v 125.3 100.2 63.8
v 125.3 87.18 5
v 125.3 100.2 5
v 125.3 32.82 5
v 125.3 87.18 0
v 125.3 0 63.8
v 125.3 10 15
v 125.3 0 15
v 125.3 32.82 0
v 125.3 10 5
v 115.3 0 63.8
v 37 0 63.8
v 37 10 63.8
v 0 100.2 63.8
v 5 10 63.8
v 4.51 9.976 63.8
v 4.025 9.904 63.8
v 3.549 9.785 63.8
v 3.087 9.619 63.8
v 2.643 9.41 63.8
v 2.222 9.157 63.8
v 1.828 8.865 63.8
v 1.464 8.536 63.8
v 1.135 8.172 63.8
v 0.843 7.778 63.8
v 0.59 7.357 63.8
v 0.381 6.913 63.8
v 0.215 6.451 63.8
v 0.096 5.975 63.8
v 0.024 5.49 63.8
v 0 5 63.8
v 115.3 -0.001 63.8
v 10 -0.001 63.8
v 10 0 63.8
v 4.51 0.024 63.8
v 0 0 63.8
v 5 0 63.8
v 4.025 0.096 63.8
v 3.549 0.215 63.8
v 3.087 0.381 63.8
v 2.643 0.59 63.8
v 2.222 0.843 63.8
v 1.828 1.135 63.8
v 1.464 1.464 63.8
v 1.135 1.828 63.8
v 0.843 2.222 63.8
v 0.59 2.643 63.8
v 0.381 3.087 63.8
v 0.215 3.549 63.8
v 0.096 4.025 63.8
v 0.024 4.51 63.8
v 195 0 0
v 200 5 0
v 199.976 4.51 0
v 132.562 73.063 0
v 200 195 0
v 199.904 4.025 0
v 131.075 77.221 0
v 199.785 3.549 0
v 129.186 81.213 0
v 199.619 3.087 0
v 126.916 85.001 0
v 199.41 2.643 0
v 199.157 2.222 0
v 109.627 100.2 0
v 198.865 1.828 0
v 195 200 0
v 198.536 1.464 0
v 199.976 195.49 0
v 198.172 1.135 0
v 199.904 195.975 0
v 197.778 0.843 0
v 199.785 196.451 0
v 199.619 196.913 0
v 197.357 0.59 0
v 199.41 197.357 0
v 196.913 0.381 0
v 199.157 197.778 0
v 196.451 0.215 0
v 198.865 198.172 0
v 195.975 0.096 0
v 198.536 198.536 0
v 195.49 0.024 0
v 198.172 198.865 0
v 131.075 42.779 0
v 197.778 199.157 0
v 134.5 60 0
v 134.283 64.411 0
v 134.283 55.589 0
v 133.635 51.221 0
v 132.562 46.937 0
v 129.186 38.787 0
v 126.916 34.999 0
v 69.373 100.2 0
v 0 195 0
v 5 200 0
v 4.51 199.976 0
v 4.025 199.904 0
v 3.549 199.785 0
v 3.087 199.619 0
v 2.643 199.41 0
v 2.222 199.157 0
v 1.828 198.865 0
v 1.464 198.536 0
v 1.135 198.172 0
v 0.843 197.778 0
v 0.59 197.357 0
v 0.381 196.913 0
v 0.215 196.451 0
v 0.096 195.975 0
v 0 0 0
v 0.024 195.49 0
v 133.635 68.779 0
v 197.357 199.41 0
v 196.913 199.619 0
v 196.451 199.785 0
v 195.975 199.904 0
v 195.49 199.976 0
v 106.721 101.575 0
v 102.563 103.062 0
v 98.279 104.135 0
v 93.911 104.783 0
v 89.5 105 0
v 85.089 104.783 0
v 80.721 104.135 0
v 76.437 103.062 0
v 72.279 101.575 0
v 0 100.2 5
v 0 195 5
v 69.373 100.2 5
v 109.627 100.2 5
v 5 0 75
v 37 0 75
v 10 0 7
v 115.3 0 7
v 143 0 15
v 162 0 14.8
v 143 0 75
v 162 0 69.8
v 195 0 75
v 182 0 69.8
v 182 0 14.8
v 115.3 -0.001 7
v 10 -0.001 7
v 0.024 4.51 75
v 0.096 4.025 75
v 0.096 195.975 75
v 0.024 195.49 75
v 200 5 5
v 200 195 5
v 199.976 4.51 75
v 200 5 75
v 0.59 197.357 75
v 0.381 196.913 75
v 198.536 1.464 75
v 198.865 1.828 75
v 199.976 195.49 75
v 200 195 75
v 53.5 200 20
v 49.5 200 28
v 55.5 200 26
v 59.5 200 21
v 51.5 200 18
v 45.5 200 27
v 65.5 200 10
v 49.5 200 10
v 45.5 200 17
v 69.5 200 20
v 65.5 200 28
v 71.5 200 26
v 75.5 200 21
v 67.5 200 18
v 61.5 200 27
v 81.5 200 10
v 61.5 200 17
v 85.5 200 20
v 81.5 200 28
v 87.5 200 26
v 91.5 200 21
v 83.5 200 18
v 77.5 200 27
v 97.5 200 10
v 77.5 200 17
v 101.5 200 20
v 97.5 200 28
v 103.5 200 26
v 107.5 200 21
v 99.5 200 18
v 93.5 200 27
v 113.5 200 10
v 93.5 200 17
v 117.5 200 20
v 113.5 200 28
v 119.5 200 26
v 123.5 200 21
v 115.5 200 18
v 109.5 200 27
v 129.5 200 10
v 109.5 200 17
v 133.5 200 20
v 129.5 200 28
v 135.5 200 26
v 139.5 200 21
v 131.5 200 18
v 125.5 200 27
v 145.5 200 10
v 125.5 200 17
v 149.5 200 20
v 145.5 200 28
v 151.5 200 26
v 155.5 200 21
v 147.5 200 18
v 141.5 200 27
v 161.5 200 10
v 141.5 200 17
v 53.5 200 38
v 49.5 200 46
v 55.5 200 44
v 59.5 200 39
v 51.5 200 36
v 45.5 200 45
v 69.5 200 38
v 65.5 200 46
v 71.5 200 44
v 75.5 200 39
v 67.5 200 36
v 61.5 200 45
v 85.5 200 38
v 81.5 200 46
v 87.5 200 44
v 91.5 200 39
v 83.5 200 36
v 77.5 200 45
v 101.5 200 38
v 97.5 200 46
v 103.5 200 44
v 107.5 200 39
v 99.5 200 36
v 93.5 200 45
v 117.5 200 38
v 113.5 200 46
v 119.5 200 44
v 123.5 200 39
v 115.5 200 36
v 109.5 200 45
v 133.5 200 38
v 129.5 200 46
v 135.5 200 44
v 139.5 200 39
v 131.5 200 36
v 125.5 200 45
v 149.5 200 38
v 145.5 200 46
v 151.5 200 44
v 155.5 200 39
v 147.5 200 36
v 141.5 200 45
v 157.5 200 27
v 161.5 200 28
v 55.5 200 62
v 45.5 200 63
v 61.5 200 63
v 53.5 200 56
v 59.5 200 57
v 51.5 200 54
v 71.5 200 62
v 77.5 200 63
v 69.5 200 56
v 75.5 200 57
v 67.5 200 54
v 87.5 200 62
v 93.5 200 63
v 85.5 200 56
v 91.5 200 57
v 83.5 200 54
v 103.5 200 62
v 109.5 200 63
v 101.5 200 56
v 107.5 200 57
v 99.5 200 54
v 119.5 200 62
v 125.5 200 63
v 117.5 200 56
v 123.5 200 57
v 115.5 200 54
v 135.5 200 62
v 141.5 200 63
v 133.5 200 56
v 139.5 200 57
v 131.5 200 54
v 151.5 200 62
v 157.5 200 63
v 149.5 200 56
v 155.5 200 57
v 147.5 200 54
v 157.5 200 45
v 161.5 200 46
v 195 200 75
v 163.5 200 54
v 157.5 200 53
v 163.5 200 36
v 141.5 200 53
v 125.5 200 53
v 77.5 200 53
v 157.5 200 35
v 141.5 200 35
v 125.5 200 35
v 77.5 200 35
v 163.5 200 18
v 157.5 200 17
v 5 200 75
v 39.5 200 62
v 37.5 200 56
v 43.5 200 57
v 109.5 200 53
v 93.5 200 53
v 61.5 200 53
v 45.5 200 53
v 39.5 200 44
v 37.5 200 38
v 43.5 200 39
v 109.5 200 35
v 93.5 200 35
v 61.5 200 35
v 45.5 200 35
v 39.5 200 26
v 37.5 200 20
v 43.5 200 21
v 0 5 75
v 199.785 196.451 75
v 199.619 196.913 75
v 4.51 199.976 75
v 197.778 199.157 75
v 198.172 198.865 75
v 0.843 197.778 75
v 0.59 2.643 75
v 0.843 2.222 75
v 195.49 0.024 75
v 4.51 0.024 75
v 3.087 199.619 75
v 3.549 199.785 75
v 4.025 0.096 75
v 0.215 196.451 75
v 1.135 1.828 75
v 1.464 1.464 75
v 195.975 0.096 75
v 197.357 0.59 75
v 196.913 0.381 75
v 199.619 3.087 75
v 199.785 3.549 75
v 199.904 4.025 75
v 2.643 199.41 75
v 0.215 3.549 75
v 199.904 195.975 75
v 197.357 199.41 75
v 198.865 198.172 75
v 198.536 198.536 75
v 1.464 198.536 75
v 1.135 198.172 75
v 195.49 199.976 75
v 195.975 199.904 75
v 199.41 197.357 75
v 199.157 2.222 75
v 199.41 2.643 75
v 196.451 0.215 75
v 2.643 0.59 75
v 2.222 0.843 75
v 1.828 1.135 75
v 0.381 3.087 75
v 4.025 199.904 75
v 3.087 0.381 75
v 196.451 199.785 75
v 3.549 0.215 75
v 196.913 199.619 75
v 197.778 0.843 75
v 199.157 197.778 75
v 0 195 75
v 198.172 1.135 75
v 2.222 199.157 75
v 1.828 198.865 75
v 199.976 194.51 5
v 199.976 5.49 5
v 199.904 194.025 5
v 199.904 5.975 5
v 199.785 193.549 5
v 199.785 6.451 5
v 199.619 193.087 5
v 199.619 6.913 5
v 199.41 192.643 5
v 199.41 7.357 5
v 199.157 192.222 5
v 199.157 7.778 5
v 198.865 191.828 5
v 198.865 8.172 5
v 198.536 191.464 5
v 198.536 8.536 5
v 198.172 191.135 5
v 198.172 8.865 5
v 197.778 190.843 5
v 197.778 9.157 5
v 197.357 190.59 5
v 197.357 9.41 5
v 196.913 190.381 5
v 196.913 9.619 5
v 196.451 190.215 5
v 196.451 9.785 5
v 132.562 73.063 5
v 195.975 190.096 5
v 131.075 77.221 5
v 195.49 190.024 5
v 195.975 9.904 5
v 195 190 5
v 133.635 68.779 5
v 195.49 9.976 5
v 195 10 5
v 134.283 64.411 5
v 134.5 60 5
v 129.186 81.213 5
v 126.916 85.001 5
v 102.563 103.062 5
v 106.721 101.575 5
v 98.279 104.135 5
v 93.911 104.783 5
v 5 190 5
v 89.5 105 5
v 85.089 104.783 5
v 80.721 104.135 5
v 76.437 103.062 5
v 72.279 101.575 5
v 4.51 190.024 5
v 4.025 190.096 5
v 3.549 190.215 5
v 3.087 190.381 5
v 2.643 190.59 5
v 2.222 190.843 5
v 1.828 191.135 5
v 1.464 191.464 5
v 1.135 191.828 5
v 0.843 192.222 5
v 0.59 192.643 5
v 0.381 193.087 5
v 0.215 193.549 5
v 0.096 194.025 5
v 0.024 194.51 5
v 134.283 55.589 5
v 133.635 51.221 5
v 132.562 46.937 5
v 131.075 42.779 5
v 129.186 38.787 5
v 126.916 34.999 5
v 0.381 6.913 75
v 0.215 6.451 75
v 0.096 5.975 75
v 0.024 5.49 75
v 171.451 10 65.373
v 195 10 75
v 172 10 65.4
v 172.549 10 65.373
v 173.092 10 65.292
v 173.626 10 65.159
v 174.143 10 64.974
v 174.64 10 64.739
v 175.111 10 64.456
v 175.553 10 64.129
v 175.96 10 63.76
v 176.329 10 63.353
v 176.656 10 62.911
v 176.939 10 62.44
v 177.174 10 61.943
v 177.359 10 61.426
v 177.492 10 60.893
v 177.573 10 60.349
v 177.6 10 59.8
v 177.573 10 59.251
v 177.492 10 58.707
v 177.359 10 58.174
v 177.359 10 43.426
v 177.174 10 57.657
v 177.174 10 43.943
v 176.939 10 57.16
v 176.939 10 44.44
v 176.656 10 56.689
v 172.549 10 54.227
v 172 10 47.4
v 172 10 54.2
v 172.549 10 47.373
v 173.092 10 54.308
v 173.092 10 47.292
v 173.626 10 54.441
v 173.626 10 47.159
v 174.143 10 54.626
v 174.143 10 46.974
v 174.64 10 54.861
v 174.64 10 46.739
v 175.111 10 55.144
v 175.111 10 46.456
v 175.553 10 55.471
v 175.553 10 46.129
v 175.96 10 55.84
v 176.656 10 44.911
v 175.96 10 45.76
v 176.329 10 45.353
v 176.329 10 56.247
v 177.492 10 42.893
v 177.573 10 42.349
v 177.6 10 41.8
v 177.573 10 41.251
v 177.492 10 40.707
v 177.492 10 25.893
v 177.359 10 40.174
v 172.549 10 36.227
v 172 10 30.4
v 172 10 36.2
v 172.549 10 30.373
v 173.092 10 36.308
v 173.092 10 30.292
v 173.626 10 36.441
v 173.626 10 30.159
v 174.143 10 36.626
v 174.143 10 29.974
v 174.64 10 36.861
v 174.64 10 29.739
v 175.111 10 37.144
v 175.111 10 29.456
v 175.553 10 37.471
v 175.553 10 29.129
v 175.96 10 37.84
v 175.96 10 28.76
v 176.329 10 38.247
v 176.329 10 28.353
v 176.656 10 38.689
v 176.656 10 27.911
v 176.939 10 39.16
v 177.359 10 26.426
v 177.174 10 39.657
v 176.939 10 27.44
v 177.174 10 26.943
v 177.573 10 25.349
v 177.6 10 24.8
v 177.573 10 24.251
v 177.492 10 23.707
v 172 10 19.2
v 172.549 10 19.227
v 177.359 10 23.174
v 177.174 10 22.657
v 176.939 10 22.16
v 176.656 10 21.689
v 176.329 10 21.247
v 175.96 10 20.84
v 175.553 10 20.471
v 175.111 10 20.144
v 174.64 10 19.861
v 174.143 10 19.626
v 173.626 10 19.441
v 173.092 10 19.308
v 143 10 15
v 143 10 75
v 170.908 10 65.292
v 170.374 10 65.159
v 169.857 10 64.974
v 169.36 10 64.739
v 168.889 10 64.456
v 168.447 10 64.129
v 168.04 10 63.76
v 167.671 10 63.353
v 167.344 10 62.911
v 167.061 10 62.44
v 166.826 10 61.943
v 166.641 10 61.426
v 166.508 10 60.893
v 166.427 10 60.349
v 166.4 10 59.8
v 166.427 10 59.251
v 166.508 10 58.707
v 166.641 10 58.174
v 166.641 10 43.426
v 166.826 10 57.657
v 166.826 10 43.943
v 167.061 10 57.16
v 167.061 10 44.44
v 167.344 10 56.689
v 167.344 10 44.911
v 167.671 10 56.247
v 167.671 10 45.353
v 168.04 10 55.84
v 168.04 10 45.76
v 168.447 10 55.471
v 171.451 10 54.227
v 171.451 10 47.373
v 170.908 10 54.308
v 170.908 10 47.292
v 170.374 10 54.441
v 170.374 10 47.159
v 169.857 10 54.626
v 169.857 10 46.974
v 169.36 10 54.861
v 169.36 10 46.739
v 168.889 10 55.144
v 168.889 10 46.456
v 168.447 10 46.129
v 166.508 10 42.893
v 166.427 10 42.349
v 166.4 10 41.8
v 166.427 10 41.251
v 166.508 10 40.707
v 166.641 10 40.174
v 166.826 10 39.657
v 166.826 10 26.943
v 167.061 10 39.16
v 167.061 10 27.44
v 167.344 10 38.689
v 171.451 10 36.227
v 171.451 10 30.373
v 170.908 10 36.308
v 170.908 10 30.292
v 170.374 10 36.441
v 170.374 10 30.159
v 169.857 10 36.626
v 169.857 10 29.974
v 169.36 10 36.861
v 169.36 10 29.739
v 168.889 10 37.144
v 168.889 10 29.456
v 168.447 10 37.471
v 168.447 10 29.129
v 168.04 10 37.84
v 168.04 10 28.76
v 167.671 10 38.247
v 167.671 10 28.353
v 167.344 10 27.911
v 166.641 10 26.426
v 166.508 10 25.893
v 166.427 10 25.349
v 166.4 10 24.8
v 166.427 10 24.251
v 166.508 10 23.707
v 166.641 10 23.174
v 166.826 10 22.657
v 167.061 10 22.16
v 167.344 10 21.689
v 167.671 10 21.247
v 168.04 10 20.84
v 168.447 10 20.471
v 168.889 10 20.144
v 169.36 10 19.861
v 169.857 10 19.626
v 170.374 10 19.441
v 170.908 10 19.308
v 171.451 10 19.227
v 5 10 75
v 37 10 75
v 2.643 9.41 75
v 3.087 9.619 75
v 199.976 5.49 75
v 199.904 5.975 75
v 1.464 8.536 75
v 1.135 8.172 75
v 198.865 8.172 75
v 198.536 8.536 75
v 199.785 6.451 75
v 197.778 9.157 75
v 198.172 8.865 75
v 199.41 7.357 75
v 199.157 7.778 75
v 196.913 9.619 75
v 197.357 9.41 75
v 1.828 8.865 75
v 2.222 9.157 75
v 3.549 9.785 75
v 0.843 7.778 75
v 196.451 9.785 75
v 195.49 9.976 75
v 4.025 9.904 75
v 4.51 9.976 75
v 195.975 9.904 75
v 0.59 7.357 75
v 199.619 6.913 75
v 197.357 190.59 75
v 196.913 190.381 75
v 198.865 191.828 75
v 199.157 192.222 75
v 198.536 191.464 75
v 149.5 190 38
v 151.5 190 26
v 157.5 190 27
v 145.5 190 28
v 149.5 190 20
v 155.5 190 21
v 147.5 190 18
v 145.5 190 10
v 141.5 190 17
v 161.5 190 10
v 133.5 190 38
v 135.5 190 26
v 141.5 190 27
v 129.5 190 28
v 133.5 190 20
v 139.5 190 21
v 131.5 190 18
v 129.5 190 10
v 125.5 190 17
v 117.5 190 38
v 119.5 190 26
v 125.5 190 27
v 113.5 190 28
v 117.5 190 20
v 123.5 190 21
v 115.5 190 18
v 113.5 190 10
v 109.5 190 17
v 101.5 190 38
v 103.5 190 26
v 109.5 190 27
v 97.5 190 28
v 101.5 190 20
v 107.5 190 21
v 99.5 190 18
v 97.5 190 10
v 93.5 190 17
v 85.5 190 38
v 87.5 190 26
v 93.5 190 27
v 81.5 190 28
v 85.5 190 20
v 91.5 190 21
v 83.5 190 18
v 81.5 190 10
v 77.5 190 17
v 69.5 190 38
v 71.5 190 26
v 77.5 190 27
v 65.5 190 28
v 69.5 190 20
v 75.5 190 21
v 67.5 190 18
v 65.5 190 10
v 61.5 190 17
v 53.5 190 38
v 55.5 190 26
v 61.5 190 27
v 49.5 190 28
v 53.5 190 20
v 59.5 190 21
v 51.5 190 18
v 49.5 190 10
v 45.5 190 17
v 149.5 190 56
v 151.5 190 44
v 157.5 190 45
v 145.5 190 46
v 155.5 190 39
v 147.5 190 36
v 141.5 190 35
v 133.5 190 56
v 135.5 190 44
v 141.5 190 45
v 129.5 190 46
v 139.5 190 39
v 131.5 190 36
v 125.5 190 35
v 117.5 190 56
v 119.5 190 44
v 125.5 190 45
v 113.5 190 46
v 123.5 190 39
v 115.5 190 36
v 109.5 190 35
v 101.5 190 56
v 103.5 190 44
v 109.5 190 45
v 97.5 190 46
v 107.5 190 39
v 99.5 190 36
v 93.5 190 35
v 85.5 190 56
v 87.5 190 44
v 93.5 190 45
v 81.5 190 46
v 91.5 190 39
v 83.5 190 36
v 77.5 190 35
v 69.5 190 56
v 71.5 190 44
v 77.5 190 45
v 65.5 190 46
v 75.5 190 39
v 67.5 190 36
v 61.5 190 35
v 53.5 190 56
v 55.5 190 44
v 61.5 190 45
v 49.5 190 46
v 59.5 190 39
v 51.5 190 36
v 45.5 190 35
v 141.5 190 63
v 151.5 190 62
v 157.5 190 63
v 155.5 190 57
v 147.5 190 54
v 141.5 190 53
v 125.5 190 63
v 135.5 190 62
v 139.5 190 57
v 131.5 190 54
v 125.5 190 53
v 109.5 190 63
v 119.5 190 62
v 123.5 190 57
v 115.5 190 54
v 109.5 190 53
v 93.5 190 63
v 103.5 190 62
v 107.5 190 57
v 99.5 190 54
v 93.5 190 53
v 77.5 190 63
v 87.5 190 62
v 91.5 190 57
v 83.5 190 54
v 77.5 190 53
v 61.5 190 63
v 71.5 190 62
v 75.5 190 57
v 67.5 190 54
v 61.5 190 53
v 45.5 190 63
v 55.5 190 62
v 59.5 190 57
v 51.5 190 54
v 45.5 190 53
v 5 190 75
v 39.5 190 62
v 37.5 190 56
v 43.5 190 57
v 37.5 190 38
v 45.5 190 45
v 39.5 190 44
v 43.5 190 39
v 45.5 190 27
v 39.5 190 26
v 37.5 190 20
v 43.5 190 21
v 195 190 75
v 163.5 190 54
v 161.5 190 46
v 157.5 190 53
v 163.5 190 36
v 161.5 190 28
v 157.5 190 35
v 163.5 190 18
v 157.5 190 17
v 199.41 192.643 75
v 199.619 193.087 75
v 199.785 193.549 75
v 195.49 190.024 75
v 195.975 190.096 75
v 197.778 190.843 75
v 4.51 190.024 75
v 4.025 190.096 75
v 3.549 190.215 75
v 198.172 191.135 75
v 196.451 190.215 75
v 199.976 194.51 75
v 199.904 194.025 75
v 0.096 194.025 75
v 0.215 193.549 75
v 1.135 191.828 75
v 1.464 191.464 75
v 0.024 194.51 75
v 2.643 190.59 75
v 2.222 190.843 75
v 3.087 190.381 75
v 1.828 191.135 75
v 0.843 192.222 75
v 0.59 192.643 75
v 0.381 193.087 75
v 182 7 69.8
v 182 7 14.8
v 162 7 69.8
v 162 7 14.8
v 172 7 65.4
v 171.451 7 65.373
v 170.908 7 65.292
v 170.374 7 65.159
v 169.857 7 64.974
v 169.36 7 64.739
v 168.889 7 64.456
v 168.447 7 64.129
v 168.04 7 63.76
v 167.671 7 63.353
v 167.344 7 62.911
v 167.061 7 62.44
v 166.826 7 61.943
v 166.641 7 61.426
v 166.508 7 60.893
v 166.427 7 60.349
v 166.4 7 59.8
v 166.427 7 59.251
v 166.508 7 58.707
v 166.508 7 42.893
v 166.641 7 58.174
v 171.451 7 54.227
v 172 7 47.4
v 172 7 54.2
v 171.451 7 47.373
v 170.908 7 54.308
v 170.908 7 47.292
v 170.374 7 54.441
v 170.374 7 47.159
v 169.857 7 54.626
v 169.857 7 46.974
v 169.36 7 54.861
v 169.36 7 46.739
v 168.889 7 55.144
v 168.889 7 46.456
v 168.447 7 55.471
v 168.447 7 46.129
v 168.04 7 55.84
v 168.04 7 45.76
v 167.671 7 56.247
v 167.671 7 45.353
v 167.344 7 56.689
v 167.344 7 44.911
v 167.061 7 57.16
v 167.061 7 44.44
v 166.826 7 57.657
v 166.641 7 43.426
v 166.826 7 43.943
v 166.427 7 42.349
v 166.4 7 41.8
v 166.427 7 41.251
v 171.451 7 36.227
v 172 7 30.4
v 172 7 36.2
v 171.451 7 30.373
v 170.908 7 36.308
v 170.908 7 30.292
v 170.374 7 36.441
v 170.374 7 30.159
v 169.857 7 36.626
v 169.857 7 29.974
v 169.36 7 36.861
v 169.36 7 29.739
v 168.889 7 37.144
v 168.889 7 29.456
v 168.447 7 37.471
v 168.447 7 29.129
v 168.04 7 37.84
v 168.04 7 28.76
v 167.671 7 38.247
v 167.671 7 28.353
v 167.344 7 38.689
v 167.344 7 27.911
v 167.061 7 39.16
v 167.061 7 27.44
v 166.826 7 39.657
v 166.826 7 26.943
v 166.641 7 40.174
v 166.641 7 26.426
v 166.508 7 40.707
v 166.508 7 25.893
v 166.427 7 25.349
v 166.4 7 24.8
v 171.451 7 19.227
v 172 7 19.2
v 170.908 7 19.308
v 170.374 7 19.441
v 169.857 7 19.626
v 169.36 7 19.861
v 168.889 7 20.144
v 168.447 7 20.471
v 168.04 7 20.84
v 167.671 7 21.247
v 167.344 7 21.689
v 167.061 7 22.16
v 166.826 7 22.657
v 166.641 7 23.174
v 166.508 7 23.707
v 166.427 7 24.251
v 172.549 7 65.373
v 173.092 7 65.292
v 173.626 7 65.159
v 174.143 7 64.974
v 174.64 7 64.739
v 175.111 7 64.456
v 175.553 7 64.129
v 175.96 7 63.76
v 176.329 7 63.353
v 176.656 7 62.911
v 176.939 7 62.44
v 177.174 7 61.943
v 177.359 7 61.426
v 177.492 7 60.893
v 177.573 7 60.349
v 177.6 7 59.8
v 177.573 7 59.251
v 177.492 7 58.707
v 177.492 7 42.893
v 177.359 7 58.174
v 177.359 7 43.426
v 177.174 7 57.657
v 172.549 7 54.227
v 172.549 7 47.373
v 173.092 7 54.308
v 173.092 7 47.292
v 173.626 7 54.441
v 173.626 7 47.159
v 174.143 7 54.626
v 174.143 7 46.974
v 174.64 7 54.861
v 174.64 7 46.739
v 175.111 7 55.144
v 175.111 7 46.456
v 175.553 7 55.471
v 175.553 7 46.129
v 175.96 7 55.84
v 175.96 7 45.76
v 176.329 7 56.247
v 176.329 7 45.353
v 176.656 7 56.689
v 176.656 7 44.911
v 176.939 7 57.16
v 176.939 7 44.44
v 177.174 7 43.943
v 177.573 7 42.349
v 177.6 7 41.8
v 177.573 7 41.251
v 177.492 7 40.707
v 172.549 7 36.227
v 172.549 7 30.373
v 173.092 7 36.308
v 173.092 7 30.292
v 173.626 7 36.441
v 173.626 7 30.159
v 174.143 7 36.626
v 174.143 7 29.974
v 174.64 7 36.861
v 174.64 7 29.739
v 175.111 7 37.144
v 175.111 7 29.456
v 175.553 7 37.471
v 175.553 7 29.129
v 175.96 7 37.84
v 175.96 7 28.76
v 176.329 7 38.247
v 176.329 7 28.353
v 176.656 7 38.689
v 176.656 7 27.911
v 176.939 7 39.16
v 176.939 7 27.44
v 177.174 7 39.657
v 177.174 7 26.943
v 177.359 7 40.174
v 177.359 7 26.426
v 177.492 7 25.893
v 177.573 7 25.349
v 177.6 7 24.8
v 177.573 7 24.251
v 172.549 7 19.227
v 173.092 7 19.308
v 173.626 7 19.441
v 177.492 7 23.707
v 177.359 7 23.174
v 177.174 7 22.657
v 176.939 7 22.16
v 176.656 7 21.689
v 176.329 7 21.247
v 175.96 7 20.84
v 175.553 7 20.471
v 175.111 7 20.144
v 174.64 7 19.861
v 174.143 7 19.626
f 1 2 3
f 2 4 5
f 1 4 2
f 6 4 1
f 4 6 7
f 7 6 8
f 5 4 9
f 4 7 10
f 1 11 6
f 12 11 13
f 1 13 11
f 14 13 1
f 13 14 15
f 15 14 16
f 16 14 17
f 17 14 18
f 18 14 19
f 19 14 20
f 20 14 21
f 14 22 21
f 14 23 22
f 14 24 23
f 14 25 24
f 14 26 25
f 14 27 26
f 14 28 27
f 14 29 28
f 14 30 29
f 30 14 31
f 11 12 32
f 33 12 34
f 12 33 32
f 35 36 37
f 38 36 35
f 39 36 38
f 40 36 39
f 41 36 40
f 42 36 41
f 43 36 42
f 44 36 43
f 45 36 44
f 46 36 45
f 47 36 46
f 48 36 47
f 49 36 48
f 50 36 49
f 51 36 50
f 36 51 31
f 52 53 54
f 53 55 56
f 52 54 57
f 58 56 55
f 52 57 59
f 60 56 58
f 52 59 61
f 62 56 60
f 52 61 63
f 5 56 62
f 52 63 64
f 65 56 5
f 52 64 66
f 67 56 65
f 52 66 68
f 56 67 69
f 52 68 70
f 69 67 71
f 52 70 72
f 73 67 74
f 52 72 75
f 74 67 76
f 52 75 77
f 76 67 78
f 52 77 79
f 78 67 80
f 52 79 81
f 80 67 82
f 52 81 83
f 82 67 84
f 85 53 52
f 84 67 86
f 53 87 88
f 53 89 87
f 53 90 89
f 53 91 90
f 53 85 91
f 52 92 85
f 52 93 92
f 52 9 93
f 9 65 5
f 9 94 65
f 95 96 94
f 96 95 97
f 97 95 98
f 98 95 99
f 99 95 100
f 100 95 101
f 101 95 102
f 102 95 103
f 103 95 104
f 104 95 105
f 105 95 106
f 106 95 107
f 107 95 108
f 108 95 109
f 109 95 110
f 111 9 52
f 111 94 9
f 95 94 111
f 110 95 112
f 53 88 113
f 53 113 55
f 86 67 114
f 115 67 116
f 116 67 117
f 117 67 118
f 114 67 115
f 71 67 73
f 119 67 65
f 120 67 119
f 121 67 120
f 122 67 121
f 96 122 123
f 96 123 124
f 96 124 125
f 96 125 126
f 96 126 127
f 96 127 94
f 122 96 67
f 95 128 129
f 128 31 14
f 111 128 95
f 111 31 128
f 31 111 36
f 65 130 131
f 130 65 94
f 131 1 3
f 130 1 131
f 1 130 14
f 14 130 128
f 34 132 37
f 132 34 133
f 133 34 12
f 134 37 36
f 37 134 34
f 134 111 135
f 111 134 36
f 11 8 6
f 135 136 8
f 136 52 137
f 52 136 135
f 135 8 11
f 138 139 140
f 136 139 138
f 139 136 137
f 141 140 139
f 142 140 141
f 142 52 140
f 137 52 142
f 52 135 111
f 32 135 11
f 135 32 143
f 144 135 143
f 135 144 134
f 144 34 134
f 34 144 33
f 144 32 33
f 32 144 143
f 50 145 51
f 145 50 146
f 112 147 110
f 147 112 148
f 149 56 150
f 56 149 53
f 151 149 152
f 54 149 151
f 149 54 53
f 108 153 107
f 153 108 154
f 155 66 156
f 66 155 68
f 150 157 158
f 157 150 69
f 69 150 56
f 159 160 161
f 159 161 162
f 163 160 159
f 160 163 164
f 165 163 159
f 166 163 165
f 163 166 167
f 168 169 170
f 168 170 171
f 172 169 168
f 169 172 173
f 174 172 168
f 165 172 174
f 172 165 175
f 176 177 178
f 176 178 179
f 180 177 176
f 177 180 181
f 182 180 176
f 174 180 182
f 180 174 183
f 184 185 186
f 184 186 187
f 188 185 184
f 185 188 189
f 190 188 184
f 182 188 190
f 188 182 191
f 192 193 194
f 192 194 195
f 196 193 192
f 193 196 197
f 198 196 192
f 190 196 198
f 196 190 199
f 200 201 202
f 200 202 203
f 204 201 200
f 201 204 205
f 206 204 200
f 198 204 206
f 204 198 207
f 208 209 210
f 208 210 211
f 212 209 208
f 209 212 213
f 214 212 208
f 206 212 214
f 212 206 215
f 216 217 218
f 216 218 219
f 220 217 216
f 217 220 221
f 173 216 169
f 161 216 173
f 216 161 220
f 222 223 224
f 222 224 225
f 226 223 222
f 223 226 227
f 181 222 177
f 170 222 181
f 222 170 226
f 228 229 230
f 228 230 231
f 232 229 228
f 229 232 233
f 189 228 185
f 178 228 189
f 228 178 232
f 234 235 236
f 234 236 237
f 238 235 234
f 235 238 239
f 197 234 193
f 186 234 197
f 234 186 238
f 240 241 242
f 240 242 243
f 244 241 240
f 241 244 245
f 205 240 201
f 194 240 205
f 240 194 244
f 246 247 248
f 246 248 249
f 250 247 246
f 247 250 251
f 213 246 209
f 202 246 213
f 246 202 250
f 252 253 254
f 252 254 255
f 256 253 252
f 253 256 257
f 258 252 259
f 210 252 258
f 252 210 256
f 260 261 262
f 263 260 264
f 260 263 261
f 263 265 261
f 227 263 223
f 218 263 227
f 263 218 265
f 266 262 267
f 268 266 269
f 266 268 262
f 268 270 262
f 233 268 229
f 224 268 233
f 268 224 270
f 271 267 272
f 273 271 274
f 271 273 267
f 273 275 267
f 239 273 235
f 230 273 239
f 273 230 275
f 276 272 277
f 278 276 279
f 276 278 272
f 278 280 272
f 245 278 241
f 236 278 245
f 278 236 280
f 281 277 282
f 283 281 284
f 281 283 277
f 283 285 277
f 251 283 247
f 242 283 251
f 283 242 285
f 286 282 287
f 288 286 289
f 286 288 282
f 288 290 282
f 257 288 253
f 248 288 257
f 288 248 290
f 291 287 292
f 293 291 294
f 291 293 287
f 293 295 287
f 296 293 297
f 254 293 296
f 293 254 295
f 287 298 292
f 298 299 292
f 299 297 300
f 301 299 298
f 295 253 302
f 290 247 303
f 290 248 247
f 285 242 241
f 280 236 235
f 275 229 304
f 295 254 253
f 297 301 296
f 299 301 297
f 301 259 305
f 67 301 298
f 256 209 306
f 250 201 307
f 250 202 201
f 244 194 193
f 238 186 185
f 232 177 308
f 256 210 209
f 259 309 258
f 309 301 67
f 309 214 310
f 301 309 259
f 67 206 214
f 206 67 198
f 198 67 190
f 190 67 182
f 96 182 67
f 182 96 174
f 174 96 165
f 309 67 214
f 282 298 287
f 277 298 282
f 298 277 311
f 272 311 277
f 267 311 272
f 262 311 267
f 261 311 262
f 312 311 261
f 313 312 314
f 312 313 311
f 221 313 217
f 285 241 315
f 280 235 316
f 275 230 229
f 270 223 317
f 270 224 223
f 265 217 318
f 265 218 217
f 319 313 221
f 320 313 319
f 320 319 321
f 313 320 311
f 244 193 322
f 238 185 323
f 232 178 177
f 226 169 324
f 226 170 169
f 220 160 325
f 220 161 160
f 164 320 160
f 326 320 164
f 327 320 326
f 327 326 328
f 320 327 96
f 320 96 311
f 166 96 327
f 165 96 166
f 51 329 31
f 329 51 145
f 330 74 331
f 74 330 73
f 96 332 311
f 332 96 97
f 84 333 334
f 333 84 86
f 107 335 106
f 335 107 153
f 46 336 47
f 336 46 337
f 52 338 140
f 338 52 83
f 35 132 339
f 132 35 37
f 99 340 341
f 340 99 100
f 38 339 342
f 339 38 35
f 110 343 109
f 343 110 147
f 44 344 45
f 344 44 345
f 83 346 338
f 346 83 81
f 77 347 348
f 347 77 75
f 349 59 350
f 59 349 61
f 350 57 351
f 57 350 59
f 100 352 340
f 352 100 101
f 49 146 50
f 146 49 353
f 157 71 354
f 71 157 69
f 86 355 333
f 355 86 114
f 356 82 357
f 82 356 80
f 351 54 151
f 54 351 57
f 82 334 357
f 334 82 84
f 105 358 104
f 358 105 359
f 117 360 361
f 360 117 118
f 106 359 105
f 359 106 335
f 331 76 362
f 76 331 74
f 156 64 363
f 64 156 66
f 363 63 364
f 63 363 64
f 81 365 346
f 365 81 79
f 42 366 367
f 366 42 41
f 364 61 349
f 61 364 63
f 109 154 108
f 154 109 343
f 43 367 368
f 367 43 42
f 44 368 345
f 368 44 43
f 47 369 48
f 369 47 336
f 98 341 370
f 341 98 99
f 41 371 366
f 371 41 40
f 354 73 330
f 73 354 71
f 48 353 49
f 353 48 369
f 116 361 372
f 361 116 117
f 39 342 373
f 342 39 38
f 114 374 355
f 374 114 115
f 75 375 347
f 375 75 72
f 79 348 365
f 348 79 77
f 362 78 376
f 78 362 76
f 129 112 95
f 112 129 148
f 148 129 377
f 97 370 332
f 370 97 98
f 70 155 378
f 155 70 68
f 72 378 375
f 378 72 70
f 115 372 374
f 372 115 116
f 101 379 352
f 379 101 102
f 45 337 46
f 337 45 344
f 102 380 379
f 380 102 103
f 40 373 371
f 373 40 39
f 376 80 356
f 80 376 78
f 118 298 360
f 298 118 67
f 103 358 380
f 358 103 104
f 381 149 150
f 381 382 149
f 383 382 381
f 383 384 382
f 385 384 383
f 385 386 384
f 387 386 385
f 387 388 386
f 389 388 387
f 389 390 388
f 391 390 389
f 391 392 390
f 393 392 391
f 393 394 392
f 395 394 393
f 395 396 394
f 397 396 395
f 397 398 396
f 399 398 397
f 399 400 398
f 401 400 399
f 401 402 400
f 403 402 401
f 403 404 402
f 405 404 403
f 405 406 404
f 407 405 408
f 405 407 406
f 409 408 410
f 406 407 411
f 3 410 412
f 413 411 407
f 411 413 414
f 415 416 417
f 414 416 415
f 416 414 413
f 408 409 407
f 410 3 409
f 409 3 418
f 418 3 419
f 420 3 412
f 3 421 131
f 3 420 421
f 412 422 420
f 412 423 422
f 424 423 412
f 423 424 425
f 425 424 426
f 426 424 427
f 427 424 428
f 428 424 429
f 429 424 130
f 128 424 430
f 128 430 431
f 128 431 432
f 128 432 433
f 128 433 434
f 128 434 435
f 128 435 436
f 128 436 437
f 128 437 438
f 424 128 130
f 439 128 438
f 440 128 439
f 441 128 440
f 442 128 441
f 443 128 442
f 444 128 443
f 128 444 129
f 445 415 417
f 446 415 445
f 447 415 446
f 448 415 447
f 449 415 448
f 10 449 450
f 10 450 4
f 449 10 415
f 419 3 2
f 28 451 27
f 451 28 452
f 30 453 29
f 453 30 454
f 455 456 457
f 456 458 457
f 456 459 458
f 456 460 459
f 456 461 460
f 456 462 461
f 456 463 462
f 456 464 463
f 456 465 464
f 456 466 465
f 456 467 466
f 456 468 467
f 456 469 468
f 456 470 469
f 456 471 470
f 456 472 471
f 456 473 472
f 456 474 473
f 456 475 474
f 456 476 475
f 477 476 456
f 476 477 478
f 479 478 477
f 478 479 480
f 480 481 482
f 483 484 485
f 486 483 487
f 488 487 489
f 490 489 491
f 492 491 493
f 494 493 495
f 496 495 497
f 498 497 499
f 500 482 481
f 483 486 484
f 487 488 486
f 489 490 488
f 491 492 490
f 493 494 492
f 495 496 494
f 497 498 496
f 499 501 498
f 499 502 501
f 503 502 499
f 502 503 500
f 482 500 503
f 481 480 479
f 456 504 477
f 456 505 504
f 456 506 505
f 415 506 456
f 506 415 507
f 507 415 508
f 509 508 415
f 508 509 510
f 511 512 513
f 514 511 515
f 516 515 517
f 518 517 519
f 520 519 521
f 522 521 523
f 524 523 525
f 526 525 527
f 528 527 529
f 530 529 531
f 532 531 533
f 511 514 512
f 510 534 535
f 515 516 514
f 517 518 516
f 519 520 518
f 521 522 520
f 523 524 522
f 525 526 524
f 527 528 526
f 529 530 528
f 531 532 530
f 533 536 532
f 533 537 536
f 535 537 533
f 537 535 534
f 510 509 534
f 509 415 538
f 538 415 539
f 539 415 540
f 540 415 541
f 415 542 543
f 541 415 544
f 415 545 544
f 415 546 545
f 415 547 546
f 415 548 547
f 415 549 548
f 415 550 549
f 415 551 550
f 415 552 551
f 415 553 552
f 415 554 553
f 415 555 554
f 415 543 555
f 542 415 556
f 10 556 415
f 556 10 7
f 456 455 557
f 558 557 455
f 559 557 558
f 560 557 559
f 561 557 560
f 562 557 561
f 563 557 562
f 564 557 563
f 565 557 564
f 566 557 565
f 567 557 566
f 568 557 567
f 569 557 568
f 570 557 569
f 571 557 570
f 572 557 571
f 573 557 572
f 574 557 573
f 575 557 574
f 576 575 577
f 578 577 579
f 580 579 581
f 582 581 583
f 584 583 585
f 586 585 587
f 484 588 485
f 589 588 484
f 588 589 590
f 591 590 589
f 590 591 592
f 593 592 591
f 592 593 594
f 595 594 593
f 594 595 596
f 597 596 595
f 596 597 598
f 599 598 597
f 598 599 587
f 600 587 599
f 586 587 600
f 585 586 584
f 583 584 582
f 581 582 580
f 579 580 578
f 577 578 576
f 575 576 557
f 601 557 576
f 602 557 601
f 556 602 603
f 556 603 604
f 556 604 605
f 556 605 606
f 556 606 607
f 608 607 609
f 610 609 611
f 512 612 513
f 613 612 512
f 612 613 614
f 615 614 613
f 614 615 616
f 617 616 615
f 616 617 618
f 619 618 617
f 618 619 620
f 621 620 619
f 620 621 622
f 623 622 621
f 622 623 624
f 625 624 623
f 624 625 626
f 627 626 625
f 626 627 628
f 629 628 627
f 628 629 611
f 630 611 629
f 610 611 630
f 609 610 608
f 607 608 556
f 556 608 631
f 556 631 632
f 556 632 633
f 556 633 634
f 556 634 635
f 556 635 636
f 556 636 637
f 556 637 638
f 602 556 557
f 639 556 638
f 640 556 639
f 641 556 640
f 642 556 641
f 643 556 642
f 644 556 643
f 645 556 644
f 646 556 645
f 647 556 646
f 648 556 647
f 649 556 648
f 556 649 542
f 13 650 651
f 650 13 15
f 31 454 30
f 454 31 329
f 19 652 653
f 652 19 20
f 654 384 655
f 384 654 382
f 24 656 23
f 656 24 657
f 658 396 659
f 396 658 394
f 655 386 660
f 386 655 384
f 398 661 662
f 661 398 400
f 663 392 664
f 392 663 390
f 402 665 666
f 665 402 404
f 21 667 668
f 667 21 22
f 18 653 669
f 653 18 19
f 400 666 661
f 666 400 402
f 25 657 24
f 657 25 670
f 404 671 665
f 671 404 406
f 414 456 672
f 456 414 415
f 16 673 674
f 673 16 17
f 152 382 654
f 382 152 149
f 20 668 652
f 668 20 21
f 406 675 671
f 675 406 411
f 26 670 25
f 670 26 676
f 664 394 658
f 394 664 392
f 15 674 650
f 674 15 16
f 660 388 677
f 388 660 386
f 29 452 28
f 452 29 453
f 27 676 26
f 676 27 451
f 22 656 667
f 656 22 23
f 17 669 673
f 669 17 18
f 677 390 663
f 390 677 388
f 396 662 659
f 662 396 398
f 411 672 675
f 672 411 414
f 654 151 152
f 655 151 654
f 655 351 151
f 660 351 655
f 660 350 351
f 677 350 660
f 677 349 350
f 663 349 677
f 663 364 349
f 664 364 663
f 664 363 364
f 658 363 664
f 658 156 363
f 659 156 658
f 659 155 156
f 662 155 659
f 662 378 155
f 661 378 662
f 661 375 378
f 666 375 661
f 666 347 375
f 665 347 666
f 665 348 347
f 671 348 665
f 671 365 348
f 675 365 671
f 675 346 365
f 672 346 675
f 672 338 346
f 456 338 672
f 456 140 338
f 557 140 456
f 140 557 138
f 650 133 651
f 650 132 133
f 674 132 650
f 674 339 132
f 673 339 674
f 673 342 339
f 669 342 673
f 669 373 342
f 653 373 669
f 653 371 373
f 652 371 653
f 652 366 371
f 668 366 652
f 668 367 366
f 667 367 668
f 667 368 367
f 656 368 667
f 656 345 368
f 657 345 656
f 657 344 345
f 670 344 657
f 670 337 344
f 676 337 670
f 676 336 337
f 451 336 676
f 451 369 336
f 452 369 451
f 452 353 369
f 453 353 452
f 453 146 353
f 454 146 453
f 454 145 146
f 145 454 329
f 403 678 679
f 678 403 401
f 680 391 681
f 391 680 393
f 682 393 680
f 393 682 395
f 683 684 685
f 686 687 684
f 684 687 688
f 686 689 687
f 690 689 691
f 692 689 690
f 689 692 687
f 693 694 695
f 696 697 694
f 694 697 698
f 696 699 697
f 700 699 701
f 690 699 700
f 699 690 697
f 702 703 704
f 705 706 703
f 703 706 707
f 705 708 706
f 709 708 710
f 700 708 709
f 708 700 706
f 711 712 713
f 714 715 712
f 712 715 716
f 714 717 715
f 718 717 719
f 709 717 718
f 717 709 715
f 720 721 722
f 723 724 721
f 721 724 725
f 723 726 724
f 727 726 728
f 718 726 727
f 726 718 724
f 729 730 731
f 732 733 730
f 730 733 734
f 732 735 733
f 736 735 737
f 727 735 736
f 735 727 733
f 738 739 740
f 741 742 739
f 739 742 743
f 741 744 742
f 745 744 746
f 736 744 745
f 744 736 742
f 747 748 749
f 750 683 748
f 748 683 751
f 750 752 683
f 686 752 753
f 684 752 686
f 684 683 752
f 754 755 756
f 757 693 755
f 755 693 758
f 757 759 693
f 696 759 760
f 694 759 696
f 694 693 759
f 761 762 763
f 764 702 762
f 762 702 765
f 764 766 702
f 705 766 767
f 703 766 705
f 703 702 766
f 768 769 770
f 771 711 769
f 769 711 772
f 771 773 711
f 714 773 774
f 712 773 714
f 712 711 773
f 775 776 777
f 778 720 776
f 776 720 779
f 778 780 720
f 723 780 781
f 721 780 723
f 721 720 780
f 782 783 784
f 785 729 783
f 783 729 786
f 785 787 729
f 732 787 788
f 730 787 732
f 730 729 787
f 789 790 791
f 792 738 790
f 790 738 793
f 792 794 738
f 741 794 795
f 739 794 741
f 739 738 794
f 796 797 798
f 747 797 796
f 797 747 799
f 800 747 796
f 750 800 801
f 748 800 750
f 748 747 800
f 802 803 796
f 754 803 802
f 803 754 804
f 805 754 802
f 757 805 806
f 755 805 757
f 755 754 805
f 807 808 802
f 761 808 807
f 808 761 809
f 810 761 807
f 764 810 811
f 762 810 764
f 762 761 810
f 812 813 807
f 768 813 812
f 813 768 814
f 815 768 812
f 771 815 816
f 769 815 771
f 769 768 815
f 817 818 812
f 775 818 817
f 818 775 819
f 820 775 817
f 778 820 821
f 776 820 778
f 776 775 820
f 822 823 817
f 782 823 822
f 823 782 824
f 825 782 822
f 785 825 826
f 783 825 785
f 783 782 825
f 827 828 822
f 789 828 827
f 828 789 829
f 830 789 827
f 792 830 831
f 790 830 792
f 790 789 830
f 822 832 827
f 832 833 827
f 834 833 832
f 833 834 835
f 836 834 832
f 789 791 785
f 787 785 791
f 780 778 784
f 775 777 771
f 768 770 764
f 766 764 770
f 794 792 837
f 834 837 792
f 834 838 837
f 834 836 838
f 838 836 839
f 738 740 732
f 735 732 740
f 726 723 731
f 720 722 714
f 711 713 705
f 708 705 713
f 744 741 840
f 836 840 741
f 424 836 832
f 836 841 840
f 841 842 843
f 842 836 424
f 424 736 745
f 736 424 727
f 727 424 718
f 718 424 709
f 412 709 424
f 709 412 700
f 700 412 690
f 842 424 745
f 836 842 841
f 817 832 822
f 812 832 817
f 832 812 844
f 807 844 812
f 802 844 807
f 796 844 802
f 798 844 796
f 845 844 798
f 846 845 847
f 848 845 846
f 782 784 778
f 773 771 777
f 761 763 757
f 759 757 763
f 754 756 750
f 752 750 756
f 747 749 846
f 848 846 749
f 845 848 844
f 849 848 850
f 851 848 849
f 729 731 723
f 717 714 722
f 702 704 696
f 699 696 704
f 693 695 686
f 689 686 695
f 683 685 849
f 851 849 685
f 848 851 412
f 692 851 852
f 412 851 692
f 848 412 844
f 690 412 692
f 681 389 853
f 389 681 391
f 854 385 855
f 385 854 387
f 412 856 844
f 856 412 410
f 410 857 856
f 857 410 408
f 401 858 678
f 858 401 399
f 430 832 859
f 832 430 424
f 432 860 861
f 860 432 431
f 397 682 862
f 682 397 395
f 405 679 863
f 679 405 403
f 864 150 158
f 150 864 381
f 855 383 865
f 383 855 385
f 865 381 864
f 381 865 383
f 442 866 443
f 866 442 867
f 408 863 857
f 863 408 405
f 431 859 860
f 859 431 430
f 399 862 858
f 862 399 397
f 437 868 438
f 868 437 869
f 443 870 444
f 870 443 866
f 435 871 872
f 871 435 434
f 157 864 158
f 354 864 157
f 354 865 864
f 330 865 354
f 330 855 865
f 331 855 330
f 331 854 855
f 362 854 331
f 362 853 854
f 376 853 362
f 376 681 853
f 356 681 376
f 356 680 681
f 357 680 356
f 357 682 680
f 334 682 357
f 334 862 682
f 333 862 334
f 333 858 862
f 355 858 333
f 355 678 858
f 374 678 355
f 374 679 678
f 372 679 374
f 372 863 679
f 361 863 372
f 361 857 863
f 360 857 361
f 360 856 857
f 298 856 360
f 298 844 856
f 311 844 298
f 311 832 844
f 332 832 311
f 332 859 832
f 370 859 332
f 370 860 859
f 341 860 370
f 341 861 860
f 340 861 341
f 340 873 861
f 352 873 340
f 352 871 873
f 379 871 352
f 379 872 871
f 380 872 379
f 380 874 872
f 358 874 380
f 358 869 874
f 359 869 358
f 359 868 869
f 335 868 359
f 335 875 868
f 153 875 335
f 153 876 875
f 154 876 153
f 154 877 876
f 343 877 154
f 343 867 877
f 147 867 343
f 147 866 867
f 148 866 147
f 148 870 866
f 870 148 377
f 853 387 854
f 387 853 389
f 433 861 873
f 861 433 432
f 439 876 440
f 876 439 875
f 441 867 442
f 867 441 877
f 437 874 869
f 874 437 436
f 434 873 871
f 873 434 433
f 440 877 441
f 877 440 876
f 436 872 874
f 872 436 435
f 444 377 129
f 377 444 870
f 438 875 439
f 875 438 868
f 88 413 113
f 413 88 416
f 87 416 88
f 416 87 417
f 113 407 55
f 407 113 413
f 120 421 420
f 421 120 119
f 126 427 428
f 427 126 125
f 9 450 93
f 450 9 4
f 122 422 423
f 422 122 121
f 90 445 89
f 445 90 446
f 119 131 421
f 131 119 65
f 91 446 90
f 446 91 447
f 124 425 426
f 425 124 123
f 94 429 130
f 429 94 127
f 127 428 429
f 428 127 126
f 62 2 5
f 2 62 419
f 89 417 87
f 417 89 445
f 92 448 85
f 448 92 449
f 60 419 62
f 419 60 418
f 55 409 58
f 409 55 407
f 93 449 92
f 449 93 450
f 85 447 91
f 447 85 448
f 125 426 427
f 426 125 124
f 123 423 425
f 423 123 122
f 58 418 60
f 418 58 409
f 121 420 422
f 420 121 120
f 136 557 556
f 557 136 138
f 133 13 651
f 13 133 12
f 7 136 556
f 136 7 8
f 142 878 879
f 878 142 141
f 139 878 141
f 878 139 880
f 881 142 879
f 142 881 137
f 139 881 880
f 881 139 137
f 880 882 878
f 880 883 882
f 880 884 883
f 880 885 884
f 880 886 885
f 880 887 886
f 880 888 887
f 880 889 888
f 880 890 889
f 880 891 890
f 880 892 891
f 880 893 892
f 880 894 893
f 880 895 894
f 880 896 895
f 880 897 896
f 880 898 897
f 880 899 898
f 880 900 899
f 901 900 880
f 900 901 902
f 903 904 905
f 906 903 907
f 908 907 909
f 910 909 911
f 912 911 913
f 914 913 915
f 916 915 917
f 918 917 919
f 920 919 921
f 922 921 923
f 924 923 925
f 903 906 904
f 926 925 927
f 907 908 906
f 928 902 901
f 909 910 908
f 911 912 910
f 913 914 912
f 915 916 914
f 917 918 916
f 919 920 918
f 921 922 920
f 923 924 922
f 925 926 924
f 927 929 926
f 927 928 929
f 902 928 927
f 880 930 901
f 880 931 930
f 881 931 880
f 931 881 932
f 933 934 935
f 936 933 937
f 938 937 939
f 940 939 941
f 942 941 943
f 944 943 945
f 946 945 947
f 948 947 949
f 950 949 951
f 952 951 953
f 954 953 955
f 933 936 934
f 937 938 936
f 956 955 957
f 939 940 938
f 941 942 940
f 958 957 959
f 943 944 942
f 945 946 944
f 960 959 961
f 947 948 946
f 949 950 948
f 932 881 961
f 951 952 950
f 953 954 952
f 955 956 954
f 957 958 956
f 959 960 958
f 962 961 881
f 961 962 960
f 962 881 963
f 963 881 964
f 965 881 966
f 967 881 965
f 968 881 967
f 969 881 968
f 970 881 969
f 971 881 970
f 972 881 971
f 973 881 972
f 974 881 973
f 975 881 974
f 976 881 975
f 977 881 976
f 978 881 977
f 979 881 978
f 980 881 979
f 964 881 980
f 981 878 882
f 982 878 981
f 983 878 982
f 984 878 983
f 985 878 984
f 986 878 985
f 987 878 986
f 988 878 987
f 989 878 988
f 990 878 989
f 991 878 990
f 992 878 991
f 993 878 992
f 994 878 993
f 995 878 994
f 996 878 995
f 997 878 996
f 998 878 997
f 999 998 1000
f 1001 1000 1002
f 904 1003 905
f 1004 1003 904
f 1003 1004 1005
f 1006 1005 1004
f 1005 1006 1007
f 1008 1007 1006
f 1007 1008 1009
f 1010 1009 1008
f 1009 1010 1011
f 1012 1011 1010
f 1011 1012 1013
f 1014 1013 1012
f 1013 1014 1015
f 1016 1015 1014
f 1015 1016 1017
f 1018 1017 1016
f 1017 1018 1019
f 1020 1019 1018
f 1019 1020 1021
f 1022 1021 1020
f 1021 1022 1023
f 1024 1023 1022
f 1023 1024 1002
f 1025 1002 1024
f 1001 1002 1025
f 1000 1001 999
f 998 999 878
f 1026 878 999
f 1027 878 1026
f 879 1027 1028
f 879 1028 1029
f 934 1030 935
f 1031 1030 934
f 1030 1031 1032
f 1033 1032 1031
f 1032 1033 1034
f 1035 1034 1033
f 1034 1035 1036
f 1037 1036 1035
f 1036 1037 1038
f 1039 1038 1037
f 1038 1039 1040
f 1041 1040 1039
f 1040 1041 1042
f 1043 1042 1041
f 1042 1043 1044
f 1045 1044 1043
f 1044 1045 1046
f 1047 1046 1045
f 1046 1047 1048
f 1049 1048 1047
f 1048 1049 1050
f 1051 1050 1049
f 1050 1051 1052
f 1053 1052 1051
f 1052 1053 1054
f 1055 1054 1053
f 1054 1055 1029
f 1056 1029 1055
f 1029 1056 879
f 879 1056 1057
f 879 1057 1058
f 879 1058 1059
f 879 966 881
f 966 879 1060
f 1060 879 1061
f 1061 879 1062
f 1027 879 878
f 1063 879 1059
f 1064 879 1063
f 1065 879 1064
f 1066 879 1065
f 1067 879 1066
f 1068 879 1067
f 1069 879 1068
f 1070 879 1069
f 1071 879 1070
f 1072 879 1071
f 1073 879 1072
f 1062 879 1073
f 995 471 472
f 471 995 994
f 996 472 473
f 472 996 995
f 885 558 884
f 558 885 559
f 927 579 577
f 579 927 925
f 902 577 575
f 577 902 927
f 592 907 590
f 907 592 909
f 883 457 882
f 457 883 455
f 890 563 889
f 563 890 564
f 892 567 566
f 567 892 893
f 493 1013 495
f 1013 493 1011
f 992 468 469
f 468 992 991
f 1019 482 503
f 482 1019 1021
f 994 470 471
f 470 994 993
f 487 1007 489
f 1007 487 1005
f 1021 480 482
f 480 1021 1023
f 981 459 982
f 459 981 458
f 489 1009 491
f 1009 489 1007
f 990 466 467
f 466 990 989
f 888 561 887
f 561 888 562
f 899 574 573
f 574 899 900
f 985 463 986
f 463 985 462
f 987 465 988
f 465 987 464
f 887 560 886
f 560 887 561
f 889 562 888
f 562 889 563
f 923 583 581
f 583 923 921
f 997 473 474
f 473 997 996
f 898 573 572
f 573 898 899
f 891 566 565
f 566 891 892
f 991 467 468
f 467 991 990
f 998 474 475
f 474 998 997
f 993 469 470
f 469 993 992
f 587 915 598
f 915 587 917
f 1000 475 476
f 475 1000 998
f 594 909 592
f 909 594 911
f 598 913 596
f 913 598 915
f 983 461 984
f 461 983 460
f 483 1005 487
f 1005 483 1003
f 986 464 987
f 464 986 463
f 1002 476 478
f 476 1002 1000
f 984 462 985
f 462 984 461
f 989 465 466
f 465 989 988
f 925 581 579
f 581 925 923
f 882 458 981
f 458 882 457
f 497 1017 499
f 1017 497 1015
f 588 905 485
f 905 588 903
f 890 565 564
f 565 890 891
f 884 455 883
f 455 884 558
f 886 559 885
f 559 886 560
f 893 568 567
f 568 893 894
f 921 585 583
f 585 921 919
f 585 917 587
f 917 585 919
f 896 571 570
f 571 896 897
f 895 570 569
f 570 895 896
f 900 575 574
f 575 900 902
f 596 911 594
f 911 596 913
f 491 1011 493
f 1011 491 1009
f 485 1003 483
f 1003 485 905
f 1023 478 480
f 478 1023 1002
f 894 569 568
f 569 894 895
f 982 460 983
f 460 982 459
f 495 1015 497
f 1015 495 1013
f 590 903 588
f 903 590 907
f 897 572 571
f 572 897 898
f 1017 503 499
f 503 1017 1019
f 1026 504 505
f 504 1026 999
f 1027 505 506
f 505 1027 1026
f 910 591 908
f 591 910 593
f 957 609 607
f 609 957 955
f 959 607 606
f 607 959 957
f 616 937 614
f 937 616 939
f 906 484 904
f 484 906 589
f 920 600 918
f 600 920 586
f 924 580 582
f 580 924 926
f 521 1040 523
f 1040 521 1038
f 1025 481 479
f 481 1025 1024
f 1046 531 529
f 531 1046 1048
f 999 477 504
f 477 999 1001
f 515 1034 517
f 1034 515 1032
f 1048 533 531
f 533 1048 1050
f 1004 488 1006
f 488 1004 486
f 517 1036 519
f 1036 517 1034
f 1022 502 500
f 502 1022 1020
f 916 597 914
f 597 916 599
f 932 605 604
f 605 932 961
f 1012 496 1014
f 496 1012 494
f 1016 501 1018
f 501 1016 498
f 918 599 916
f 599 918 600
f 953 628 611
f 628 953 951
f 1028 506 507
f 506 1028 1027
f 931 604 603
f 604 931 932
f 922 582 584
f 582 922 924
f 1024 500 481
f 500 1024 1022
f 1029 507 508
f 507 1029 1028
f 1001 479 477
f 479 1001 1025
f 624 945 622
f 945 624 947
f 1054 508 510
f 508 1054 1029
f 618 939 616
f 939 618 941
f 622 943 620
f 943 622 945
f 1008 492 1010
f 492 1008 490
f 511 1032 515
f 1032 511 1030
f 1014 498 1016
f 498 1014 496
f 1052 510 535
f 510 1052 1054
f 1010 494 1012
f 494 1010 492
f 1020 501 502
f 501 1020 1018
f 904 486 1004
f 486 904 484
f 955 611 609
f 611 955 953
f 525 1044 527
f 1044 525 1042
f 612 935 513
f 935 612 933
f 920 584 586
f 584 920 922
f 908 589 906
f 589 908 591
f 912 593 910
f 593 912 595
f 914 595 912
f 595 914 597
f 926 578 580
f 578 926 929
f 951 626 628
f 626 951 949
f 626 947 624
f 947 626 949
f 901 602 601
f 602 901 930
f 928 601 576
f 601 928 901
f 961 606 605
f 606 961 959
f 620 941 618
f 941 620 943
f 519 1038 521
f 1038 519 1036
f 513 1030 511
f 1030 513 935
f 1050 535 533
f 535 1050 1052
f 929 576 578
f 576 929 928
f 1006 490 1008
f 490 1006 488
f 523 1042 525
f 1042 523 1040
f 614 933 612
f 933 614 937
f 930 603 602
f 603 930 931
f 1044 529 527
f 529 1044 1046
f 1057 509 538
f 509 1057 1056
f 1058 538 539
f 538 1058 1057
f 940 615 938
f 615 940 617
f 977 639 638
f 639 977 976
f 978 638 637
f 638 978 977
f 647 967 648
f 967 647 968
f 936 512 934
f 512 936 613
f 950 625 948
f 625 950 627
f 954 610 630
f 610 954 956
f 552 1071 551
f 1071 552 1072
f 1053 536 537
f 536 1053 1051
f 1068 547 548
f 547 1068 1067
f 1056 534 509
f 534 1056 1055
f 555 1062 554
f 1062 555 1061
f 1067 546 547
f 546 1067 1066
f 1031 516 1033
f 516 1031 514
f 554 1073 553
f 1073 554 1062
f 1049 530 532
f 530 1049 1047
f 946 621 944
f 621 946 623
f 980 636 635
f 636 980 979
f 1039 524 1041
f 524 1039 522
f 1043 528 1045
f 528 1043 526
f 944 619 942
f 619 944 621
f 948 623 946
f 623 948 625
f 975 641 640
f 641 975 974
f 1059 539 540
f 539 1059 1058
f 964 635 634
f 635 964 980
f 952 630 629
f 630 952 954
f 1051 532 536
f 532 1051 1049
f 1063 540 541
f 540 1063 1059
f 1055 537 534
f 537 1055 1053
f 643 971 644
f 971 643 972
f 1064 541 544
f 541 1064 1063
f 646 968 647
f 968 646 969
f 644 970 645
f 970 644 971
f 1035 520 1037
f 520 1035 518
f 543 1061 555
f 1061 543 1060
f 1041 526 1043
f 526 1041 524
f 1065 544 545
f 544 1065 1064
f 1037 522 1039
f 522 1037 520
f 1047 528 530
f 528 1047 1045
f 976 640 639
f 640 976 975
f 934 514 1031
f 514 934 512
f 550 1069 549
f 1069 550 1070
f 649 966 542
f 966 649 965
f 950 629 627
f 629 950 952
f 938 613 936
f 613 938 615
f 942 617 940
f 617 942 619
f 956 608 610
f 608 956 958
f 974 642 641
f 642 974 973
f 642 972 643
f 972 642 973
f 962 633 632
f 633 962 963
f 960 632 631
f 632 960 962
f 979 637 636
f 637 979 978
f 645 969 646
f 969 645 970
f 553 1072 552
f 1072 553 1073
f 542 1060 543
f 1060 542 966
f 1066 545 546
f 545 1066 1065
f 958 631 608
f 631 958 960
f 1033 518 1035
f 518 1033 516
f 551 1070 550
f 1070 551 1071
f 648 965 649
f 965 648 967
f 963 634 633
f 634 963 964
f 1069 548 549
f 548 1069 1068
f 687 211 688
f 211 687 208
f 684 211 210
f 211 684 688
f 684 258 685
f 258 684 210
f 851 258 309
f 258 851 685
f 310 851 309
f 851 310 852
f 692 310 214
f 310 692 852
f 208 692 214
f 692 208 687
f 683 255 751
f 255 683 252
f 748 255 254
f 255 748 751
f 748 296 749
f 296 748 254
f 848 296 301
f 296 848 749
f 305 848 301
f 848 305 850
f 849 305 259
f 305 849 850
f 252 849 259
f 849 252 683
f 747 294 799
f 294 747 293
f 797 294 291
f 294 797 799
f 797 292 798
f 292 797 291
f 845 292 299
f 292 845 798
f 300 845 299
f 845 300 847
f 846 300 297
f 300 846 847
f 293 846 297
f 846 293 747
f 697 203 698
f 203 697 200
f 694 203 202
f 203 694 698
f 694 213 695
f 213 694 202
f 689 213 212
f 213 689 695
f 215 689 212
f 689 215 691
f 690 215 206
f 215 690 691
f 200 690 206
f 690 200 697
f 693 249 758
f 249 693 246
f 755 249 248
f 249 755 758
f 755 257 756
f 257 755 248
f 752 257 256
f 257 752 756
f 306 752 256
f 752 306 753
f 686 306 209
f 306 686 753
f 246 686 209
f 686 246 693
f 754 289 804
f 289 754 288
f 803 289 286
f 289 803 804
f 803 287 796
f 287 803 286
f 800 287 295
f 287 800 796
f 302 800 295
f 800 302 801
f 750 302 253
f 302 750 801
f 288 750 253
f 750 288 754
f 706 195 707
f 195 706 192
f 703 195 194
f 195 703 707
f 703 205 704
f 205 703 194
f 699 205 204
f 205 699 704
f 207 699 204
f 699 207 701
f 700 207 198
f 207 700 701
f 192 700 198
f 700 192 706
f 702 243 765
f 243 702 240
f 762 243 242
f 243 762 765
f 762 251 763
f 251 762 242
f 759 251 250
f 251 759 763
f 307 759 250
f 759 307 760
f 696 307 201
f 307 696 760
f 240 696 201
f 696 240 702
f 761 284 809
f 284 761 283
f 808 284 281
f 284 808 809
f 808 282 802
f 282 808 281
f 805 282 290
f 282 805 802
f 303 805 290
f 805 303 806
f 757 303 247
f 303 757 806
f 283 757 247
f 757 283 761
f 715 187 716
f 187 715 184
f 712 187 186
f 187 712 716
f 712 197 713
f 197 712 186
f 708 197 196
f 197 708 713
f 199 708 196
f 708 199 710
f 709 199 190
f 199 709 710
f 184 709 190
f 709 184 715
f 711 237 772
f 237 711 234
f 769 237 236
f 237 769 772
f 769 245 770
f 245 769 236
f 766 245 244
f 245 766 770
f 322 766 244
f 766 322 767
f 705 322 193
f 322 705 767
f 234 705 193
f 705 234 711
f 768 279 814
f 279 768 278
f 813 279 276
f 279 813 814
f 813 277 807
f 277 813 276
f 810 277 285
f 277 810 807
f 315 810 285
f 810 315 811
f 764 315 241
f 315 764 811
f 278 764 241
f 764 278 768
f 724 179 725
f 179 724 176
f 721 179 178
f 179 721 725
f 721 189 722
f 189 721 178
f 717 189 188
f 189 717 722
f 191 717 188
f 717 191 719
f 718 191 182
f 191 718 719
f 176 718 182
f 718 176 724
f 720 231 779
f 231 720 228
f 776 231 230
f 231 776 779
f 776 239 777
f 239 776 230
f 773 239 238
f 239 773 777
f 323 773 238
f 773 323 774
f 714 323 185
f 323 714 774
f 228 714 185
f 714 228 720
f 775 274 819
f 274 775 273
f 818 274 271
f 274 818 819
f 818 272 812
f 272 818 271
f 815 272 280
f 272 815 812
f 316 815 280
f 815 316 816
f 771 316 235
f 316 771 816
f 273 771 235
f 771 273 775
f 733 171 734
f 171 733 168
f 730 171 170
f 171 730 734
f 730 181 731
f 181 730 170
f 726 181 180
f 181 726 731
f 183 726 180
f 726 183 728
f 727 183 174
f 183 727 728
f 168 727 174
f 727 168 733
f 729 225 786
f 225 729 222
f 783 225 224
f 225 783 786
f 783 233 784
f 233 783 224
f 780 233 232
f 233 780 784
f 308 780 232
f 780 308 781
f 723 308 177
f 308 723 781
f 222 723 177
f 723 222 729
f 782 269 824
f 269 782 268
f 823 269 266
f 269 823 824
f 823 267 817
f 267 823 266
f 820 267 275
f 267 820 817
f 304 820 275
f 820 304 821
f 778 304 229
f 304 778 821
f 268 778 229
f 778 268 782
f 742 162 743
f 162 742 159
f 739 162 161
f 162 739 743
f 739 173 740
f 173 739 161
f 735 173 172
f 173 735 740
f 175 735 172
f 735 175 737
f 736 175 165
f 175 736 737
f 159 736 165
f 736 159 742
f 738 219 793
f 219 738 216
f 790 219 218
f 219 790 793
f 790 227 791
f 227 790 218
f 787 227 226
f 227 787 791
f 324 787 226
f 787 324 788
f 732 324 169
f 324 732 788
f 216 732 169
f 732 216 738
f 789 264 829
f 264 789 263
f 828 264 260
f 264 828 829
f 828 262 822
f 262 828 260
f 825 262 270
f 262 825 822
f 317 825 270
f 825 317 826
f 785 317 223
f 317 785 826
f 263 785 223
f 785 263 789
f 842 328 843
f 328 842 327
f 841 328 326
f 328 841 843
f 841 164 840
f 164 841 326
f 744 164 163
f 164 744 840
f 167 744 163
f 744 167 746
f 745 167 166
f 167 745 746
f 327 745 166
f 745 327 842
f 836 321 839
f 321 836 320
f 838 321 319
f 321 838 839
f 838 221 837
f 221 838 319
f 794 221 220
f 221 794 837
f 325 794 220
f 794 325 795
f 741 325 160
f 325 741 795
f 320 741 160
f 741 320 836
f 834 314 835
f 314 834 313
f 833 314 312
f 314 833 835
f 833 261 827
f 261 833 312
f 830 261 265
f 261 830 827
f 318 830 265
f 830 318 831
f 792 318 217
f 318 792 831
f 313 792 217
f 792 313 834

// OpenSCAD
totalLength = 200;
totalWidth = 200;
totalHeight = 75;


innerLength = 180;

basePlateHeight = 5;
topPlateHeight = 5;
convexity = 20;
$fn=64;

cDiameter = 10;
cRadius = cDiameter/2;
cRad = cRadius;
cPos1 = [cRad, cRad, 0];

cDelta = [
    // bottom
    [0,0,0],
    [cDiameter+innerLength, 0, 0],
    [cDiameter+innerLength,cDiameter+innerLength, 0],
    [0, cDiameter+innerLength, 0],
    // top
    [0,0,totalHeight-topPlateHeight],
    [cDiameter+innerLength, 0, totalHeight-topPlateHeight],
    [cDiameter+innerLength,cDiameter+innerLength, totalHeight-topPlateHeight],
    [0, cDiameter+innerLength, totalHeight-topPlateHeight]
];

function cPos(idx) = cPos1 + cDelta[idx];

module cyl(idx) {
    translate(v=cPos(idx)) cylinder(r=cRadius,h=idx < 4? basePlateHeight: topPlateHeight);
};


module bottomPlate() { 
    hull() { cyl(0); cyl(1); cyl(2); cyl(3);};
}
module topPlate() {
    hull() { cyl(4); cyl(5); cyl(6); cyl(7);};
};


module frontFace() {
hull() { cyl(0); cyl(4); cyl(1); cyl(5);};
};
module backFace() {
hull() { cyl(2); cyl(6); cyl(7); cyl(3);};
};


module frame() {
    bottomPlate();
    //topPlate();
    frontFace();
    backFace();
    
    // pillars
    hull() { cyl(0); cyl(4);};
    hull() { cyl(1); cyl(5);};
    hull() { cyl(2); cyl(6);};
    hull() { cyl(3); cyl(7);};
}


module sfxPowerSupply() {
    // corsair sf450
    length = 125.3;
    width = 100.2;
    height = 63.8;
    screwD = 3.5;
    
    eps = 0.001;
    
    // body
    color([0,1,0]) cube(size=[length, width, height]);
    
    // main fan
    color([0,1,1])
    translate([62.5, 50,0])
    circle(d=88);
    
    
    // open faces
    color([0,1,1])
    translate([10,-eps, 7])
    cube(size=[length-20, eps, height-7]);

    
    // screw holes
    color([1,0,1])
    translate([length-6, eps, height-6])
    rotate(a=[90,0,0])
    circle(d=screwD);
    
    color([1,0,1])
    translate([6, eps, height-6])
    rotate(a=[90,0,0])
    circle(d=screwD);
    
    color([1,0,1])
    translate([6, eps, 6])
    rotate(a=[90,0,0])
    circle(d=screwD);
    
    color([1,0,1])
    translate([length-6, eps, 6])
    rotate(a=[90,0,0])
    circle(d=screwD);
        
    color([1,0,1])
    translate([6, eps, height-(6+25.5)])
    rotate(a=[90,0,0])
    circle(d=screwD);
    
    color([1,0,1])
    translate([length-6, eps, height-(6+25.5)])
    rotate(a=[90,0,0])
    circle(d=screwD);
    // atx connectors - NA
    
}

sfxPowerSupply();

module walls() {
difference() {
union() {
difference() {
difference() {
    frame();
    translate([62.5+37-10, 50+10,-25])
    cylinder(d=90, h=50);
};
    translate([47-10, -10, -10])
    cube(size=[106,20,100]);
};
translate(v=[25-10,0,-0])
cube(size=[totalLength*0.7, 10, 15]);
}
translate(v=[10,0,-0.2])
plate();
}
}



module plate() {
union() {
    translate(v=[totalLength-48, -1, 15])
    cube(size=[20, 8, 55]);
    
    translate([totalLength-38, 10, 60])
    rotate(a=[90,0,0])
    cylinder(d=11.2, h=50);

    translate([totalLength-38, 10, 42])
    rotate(a=[90,0,0])
    cylinder(d=11.2, h=50);

    translate([totalLength-38, 10, 25])
    rotate(a=[90,0,0])
    cylinder(d=11.2, h=50);
 };

};


module lightning() {
    linear_extrude(50)
    polygon(
        points = [
            [0,0],
            [12,10],
            [6,11],
            [10,16],
            [4,17],
            [-2,8],
            [4,7]
    ]);
}

module decal(numL, numW, sca) {
    dL = sca * 16;
    dW = sca * 18;
    
    for (i=[0:numL-1]) {
        for (j=[0:numW-1]) {
                translate(v=[i*dL,j*dW,0])
                scale(sca)
                lightning();
        }
        
    }
}

difference() {
    walls();
    rotate(a=[90,0,180])
    translate(v=[-161.5,10,180])
    decal(8, 3, 1.0);
};
translate([28, 16, 6])
*sfxPowerSupply();
